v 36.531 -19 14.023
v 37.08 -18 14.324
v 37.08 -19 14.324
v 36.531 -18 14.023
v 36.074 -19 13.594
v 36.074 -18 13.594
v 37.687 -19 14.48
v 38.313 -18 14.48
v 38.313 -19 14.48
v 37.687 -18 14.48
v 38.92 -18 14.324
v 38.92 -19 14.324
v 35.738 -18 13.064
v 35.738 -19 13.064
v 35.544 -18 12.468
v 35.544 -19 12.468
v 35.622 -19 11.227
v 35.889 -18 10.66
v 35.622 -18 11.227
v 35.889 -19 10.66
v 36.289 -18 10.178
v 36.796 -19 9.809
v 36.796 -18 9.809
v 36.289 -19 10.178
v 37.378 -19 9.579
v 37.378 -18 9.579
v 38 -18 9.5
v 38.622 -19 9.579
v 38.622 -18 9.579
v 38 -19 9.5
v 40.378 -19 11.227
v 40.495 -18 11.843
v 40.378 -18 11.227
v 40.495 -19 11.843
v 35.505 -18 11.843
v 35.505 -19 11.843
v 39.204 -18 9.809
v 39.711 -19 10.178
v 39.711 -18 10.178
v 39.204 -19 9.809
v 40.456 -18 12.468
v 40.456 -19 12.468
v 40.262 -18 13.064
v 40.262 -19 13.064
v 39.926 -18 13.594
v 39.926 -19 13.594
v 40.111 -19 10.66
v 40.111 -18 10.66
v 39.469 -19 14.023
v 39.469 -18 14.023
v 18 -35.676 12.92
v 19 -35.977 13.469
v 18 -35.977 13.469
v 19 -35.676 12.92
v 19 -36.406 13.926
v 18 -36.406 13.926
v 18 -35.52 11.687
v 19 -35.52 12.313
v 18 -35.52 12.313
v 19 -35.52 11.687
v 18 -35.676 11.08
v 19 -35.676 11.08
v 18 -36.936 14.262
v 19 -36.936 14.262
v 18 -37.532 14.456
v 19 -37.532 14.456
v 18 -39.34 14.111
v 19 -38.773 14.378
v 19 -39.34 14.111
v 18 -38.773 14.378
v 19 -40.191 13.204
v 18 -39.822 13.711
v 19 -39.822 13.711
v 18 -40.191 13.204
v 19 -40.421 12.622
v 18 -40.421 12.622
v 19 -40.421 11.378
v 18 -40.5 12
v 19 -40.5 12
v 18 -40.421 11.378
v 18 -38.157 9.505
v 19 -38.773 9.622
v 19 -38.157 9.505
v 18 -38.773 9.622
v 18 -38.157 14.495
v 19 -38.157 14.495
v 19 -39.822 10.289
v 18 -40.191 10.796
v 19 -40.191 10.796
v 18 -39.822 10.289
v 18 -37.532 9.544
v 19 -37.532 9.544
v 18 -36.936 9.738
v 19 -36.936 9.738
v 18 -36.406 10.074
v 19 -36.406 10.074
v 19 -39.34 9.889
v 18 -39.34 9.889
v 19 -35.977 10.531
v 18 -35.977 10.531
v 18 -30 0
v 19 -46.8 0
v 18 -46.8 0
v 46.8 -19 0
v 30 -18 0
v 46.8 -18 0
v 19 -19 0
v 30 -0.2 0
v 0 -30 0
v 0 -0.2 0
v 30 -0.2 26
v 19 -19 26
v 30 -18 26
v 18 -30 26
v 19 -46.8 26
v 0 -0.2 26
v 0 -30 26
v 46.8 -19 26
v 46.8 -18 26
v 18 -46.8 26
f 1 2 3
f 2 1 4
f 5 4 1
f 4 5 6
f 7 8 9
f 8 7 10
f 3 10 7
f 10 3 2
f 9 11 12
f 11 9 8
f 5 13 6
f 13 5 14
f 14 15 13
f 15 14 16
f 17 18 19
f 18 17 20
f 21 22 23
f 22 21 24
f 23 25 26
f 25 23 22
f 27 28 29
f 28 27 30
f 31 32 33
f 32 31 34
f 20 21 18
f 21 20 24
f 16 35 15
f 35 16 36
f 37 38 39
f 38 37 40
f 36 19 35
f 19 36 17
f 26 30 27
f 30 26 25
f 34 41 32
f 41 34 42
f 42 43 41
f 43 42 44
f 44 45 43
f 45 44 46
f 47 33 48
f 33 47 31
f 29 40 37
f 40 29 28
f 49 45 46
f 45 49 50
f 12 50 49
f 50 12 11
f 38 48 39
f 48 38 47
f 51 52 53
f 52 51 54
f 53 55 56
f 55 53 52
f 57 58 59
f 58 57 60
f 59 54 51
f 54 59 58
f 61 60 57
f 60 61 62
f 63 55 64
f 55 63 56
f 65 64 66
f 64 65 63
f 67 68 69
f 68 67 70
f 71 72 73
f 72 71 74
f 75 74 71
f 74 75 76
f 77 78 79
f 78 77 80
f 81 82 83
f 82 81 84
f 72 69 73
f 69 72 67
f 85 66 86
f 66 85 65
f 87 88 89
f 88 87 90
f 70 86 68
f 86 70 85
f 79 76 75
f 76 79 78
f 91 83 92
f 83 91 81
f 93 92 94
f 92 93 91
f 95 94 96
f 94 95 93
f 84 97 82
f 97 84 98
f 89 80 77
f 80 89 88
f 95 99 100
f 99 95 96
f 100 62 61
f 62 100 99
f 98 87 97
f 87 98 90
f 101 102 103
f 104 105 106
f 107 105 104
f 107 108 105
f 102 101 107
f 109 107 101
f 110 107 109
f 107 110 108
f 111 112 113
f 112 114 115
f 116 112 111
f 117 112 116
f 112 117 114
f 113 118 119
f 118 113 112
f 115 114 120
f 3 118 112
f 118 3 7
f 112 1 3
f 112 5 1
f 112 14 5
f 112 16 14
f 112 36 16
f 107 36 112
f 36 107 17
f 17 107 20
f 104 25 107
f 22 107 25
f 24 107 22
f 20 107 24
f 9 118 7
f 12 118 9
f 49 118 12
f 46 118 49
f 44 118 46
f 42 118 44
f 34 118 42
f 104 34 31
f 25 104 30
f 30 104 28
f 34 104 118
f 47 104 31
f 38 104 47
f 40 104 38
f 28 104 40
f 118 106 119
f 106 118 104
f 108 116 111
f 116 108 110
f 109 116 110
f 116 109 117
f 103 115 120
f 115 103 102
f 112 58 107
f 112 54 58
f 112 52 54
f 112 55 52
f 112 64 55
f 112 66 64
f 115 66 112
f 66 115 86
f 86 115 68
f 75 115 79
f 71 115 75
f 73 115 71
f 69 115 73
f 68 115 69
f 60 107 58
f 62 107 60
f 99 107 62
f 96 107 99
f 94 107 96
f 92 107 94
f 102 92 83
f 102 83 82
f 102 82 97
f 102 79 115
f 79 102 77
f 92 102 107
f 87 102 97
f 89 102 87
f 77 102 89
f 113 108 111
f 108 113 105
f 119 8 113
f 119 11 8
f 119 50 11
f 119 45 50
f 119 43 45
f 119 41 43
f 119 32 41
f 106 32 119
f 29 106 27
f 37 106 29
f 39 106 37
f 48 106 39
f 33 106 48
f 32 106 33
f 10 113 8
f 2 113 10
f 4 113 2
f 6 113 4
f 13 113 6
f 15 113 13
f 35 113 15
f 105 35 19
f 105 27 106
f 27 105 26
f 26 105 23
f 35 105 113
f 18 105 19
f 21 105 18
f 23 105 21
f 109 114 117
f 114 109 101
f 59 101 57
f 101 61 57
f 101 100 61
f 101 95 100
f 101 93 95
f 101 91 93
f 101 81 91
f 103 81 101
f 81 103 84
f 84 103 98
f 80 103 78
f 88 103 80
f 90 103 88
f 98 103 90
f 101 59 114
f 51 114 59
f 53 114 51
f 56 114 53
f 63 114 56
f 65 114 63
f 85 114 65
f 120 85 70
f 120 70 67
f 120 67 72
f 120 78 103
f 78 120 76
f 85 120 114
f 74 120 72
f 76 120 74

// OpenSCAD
$fn = 25;

module profile() {
    intersection() {
        difference() {
            translate([0, -47])
            square([46.8, 46.8]);
            rotate([0, 0, -90])
            import("/home/michalz/listwa.dxf");
        }
        
        union() {
            translate([0, -19])
            square([46.8, 19]);
            translate([0, -46.8])
            square([19, 46.8]);
            translate([18, -18])
            rotate([0, 0, -90])
            import("/home/michalz/listwa.dxf");
        }
    }
}


difference() {
    linear_extrude(height=26)
    profile();
    
    translate([38, -42, 12])
    rotate([0, 90, 90])
    screw_hole();
    
    translate([42, -38, 12])
    rotate([90, 0, 270])
    screw_hole();
    
    translate([30, -18, 0])
    linear_extrude(height=26)
    square([18, 18]);
    
    translate([0, -48, 0])
    linear_extrude(height=26)
    square([18, 18]);
}

module screw_hole() {
    translate([0, 0, 17])
    linear_extrude(height=24)
    circle(d=5);
    translate([0, 0, 15])
    hull() {
        translate([0, 0, 3])
        linear_extrude(1)   
        circle(d=5);
    
        linear_extrude(1)
        circle(d=10);
    };
    linear_extrude(15)
    circle(d=10);
}
